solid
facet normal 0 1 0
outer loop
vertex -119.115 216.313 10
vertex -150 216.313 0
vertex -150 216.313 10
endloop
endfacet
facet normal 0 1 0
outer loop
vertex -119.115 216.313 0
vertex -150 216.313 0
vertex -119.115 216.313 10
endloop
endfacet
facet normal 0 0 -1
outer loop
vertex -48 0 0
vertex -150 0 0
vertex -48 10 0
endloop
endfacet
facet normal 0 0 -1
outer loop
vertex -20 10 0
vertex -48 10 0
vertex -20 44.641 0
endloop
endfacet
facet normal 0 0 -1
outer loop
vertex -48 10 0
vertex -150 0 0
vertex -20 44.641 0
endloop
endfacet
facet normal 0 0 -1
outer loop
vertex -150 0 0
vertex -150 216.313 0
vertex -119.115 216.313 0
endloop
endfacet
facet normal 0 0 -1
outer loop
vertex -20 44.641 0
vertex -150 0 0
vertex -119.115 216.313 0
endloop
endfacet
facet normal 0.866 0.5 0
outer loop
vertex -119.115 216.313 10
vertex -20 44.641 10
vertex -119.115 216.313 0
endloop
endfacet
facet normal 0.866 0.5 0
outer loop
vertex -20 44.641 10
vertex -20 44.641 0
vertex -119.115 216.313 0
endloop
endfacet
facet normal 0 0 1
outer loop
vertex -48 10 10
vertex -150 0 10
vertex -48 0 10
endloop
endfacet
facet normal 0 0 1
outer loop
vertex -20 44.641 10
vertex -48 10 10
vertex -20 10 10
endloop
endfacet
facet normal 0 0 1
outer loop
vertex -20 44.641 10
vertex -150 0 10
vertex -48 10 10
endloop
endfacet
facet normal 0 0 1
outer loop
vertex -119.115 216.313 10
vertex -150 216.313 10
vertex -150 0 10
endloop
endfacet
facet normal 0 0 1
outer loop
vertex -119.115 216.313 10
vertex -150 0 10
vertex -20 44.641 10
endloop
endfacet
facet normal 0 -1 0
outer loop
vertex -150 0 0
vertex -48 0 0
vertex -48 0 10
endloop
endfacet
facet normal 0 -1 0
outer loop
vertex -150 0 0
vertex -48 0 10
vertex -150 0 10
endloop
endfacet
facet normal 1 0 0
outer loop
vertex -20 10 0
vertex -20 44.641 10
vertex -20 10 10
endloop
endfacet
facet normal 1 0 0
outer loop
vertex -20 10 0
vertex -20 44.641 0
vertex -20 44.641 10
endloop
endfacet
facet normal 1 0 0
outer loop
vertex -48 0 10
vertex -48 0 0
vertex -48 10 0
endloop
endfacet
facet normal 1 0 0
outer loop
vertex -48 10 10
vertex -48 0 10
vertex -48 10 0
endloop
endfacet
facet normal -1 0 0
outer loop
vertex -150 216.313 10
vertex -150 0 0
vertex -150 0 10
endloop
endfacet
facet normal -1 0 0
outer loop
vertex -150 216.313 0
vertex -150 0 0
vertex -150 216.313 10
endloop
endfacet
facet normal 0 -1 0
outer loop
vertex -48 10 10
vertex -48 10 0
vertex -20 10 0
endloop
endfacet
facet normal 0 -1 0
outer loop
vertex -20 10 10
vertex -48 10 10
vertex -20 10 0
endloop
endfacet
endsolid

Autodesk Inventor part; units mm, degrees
ref_plane "YZ Plane" through (0, 0, 0) normal (1, 0, 0) x (0, 1, 0)
ref_plane "XZ Plane" through (0, 0, 0) normal (0, 1, 0) x (-1, 0, 0)
ref_plane "XY Plane" through (0, 0, 0) normal (0, 0, 1) x (1, 0, 0)
sketch "Sketch3" plane through (0, 0, 0) normal (0, 0, 1) x (1, 0, 0)
  line L0 (0, 0) -> (-150, 0)
  line L1 (-150, 0) -> (-150, 10)
  line L2 (-150, 10) -> (0, 10)
  line L3 (0, 10) -> (0, 0)
  line L4 (0, 10) -> (-150, 269.8076)
  line L5 (-150, 269.8076) -> (-150, 10)
  line L6 (-20, 44.641) -> (-20, 10)
  line L7 (-48, 0) -> (-48, 93.1384)
  line L8 (-150, 216.3134) -> (-119.1151, 216.3134)
  point P0 (-48, 10)
  dimension "d19" = 150
  dimension "d29" = 10
  dimension "d31" = 60
  dimension "d32" = 20
  dimension "d34" = 48
extrude "Plate3" add sketch "Sketch3" along normal blind 10 contours L0 L1 L2 L7 | L7 L4 L6 L2 | L2 L5 L8 L4 L7
equation "\"d18\" = Thickness"
equation "\"BendReliefDepth\" = 0.5 * Thickness"
equation "\"Thickness\" = 10"
properties part number "NVPH-319 conductor"
